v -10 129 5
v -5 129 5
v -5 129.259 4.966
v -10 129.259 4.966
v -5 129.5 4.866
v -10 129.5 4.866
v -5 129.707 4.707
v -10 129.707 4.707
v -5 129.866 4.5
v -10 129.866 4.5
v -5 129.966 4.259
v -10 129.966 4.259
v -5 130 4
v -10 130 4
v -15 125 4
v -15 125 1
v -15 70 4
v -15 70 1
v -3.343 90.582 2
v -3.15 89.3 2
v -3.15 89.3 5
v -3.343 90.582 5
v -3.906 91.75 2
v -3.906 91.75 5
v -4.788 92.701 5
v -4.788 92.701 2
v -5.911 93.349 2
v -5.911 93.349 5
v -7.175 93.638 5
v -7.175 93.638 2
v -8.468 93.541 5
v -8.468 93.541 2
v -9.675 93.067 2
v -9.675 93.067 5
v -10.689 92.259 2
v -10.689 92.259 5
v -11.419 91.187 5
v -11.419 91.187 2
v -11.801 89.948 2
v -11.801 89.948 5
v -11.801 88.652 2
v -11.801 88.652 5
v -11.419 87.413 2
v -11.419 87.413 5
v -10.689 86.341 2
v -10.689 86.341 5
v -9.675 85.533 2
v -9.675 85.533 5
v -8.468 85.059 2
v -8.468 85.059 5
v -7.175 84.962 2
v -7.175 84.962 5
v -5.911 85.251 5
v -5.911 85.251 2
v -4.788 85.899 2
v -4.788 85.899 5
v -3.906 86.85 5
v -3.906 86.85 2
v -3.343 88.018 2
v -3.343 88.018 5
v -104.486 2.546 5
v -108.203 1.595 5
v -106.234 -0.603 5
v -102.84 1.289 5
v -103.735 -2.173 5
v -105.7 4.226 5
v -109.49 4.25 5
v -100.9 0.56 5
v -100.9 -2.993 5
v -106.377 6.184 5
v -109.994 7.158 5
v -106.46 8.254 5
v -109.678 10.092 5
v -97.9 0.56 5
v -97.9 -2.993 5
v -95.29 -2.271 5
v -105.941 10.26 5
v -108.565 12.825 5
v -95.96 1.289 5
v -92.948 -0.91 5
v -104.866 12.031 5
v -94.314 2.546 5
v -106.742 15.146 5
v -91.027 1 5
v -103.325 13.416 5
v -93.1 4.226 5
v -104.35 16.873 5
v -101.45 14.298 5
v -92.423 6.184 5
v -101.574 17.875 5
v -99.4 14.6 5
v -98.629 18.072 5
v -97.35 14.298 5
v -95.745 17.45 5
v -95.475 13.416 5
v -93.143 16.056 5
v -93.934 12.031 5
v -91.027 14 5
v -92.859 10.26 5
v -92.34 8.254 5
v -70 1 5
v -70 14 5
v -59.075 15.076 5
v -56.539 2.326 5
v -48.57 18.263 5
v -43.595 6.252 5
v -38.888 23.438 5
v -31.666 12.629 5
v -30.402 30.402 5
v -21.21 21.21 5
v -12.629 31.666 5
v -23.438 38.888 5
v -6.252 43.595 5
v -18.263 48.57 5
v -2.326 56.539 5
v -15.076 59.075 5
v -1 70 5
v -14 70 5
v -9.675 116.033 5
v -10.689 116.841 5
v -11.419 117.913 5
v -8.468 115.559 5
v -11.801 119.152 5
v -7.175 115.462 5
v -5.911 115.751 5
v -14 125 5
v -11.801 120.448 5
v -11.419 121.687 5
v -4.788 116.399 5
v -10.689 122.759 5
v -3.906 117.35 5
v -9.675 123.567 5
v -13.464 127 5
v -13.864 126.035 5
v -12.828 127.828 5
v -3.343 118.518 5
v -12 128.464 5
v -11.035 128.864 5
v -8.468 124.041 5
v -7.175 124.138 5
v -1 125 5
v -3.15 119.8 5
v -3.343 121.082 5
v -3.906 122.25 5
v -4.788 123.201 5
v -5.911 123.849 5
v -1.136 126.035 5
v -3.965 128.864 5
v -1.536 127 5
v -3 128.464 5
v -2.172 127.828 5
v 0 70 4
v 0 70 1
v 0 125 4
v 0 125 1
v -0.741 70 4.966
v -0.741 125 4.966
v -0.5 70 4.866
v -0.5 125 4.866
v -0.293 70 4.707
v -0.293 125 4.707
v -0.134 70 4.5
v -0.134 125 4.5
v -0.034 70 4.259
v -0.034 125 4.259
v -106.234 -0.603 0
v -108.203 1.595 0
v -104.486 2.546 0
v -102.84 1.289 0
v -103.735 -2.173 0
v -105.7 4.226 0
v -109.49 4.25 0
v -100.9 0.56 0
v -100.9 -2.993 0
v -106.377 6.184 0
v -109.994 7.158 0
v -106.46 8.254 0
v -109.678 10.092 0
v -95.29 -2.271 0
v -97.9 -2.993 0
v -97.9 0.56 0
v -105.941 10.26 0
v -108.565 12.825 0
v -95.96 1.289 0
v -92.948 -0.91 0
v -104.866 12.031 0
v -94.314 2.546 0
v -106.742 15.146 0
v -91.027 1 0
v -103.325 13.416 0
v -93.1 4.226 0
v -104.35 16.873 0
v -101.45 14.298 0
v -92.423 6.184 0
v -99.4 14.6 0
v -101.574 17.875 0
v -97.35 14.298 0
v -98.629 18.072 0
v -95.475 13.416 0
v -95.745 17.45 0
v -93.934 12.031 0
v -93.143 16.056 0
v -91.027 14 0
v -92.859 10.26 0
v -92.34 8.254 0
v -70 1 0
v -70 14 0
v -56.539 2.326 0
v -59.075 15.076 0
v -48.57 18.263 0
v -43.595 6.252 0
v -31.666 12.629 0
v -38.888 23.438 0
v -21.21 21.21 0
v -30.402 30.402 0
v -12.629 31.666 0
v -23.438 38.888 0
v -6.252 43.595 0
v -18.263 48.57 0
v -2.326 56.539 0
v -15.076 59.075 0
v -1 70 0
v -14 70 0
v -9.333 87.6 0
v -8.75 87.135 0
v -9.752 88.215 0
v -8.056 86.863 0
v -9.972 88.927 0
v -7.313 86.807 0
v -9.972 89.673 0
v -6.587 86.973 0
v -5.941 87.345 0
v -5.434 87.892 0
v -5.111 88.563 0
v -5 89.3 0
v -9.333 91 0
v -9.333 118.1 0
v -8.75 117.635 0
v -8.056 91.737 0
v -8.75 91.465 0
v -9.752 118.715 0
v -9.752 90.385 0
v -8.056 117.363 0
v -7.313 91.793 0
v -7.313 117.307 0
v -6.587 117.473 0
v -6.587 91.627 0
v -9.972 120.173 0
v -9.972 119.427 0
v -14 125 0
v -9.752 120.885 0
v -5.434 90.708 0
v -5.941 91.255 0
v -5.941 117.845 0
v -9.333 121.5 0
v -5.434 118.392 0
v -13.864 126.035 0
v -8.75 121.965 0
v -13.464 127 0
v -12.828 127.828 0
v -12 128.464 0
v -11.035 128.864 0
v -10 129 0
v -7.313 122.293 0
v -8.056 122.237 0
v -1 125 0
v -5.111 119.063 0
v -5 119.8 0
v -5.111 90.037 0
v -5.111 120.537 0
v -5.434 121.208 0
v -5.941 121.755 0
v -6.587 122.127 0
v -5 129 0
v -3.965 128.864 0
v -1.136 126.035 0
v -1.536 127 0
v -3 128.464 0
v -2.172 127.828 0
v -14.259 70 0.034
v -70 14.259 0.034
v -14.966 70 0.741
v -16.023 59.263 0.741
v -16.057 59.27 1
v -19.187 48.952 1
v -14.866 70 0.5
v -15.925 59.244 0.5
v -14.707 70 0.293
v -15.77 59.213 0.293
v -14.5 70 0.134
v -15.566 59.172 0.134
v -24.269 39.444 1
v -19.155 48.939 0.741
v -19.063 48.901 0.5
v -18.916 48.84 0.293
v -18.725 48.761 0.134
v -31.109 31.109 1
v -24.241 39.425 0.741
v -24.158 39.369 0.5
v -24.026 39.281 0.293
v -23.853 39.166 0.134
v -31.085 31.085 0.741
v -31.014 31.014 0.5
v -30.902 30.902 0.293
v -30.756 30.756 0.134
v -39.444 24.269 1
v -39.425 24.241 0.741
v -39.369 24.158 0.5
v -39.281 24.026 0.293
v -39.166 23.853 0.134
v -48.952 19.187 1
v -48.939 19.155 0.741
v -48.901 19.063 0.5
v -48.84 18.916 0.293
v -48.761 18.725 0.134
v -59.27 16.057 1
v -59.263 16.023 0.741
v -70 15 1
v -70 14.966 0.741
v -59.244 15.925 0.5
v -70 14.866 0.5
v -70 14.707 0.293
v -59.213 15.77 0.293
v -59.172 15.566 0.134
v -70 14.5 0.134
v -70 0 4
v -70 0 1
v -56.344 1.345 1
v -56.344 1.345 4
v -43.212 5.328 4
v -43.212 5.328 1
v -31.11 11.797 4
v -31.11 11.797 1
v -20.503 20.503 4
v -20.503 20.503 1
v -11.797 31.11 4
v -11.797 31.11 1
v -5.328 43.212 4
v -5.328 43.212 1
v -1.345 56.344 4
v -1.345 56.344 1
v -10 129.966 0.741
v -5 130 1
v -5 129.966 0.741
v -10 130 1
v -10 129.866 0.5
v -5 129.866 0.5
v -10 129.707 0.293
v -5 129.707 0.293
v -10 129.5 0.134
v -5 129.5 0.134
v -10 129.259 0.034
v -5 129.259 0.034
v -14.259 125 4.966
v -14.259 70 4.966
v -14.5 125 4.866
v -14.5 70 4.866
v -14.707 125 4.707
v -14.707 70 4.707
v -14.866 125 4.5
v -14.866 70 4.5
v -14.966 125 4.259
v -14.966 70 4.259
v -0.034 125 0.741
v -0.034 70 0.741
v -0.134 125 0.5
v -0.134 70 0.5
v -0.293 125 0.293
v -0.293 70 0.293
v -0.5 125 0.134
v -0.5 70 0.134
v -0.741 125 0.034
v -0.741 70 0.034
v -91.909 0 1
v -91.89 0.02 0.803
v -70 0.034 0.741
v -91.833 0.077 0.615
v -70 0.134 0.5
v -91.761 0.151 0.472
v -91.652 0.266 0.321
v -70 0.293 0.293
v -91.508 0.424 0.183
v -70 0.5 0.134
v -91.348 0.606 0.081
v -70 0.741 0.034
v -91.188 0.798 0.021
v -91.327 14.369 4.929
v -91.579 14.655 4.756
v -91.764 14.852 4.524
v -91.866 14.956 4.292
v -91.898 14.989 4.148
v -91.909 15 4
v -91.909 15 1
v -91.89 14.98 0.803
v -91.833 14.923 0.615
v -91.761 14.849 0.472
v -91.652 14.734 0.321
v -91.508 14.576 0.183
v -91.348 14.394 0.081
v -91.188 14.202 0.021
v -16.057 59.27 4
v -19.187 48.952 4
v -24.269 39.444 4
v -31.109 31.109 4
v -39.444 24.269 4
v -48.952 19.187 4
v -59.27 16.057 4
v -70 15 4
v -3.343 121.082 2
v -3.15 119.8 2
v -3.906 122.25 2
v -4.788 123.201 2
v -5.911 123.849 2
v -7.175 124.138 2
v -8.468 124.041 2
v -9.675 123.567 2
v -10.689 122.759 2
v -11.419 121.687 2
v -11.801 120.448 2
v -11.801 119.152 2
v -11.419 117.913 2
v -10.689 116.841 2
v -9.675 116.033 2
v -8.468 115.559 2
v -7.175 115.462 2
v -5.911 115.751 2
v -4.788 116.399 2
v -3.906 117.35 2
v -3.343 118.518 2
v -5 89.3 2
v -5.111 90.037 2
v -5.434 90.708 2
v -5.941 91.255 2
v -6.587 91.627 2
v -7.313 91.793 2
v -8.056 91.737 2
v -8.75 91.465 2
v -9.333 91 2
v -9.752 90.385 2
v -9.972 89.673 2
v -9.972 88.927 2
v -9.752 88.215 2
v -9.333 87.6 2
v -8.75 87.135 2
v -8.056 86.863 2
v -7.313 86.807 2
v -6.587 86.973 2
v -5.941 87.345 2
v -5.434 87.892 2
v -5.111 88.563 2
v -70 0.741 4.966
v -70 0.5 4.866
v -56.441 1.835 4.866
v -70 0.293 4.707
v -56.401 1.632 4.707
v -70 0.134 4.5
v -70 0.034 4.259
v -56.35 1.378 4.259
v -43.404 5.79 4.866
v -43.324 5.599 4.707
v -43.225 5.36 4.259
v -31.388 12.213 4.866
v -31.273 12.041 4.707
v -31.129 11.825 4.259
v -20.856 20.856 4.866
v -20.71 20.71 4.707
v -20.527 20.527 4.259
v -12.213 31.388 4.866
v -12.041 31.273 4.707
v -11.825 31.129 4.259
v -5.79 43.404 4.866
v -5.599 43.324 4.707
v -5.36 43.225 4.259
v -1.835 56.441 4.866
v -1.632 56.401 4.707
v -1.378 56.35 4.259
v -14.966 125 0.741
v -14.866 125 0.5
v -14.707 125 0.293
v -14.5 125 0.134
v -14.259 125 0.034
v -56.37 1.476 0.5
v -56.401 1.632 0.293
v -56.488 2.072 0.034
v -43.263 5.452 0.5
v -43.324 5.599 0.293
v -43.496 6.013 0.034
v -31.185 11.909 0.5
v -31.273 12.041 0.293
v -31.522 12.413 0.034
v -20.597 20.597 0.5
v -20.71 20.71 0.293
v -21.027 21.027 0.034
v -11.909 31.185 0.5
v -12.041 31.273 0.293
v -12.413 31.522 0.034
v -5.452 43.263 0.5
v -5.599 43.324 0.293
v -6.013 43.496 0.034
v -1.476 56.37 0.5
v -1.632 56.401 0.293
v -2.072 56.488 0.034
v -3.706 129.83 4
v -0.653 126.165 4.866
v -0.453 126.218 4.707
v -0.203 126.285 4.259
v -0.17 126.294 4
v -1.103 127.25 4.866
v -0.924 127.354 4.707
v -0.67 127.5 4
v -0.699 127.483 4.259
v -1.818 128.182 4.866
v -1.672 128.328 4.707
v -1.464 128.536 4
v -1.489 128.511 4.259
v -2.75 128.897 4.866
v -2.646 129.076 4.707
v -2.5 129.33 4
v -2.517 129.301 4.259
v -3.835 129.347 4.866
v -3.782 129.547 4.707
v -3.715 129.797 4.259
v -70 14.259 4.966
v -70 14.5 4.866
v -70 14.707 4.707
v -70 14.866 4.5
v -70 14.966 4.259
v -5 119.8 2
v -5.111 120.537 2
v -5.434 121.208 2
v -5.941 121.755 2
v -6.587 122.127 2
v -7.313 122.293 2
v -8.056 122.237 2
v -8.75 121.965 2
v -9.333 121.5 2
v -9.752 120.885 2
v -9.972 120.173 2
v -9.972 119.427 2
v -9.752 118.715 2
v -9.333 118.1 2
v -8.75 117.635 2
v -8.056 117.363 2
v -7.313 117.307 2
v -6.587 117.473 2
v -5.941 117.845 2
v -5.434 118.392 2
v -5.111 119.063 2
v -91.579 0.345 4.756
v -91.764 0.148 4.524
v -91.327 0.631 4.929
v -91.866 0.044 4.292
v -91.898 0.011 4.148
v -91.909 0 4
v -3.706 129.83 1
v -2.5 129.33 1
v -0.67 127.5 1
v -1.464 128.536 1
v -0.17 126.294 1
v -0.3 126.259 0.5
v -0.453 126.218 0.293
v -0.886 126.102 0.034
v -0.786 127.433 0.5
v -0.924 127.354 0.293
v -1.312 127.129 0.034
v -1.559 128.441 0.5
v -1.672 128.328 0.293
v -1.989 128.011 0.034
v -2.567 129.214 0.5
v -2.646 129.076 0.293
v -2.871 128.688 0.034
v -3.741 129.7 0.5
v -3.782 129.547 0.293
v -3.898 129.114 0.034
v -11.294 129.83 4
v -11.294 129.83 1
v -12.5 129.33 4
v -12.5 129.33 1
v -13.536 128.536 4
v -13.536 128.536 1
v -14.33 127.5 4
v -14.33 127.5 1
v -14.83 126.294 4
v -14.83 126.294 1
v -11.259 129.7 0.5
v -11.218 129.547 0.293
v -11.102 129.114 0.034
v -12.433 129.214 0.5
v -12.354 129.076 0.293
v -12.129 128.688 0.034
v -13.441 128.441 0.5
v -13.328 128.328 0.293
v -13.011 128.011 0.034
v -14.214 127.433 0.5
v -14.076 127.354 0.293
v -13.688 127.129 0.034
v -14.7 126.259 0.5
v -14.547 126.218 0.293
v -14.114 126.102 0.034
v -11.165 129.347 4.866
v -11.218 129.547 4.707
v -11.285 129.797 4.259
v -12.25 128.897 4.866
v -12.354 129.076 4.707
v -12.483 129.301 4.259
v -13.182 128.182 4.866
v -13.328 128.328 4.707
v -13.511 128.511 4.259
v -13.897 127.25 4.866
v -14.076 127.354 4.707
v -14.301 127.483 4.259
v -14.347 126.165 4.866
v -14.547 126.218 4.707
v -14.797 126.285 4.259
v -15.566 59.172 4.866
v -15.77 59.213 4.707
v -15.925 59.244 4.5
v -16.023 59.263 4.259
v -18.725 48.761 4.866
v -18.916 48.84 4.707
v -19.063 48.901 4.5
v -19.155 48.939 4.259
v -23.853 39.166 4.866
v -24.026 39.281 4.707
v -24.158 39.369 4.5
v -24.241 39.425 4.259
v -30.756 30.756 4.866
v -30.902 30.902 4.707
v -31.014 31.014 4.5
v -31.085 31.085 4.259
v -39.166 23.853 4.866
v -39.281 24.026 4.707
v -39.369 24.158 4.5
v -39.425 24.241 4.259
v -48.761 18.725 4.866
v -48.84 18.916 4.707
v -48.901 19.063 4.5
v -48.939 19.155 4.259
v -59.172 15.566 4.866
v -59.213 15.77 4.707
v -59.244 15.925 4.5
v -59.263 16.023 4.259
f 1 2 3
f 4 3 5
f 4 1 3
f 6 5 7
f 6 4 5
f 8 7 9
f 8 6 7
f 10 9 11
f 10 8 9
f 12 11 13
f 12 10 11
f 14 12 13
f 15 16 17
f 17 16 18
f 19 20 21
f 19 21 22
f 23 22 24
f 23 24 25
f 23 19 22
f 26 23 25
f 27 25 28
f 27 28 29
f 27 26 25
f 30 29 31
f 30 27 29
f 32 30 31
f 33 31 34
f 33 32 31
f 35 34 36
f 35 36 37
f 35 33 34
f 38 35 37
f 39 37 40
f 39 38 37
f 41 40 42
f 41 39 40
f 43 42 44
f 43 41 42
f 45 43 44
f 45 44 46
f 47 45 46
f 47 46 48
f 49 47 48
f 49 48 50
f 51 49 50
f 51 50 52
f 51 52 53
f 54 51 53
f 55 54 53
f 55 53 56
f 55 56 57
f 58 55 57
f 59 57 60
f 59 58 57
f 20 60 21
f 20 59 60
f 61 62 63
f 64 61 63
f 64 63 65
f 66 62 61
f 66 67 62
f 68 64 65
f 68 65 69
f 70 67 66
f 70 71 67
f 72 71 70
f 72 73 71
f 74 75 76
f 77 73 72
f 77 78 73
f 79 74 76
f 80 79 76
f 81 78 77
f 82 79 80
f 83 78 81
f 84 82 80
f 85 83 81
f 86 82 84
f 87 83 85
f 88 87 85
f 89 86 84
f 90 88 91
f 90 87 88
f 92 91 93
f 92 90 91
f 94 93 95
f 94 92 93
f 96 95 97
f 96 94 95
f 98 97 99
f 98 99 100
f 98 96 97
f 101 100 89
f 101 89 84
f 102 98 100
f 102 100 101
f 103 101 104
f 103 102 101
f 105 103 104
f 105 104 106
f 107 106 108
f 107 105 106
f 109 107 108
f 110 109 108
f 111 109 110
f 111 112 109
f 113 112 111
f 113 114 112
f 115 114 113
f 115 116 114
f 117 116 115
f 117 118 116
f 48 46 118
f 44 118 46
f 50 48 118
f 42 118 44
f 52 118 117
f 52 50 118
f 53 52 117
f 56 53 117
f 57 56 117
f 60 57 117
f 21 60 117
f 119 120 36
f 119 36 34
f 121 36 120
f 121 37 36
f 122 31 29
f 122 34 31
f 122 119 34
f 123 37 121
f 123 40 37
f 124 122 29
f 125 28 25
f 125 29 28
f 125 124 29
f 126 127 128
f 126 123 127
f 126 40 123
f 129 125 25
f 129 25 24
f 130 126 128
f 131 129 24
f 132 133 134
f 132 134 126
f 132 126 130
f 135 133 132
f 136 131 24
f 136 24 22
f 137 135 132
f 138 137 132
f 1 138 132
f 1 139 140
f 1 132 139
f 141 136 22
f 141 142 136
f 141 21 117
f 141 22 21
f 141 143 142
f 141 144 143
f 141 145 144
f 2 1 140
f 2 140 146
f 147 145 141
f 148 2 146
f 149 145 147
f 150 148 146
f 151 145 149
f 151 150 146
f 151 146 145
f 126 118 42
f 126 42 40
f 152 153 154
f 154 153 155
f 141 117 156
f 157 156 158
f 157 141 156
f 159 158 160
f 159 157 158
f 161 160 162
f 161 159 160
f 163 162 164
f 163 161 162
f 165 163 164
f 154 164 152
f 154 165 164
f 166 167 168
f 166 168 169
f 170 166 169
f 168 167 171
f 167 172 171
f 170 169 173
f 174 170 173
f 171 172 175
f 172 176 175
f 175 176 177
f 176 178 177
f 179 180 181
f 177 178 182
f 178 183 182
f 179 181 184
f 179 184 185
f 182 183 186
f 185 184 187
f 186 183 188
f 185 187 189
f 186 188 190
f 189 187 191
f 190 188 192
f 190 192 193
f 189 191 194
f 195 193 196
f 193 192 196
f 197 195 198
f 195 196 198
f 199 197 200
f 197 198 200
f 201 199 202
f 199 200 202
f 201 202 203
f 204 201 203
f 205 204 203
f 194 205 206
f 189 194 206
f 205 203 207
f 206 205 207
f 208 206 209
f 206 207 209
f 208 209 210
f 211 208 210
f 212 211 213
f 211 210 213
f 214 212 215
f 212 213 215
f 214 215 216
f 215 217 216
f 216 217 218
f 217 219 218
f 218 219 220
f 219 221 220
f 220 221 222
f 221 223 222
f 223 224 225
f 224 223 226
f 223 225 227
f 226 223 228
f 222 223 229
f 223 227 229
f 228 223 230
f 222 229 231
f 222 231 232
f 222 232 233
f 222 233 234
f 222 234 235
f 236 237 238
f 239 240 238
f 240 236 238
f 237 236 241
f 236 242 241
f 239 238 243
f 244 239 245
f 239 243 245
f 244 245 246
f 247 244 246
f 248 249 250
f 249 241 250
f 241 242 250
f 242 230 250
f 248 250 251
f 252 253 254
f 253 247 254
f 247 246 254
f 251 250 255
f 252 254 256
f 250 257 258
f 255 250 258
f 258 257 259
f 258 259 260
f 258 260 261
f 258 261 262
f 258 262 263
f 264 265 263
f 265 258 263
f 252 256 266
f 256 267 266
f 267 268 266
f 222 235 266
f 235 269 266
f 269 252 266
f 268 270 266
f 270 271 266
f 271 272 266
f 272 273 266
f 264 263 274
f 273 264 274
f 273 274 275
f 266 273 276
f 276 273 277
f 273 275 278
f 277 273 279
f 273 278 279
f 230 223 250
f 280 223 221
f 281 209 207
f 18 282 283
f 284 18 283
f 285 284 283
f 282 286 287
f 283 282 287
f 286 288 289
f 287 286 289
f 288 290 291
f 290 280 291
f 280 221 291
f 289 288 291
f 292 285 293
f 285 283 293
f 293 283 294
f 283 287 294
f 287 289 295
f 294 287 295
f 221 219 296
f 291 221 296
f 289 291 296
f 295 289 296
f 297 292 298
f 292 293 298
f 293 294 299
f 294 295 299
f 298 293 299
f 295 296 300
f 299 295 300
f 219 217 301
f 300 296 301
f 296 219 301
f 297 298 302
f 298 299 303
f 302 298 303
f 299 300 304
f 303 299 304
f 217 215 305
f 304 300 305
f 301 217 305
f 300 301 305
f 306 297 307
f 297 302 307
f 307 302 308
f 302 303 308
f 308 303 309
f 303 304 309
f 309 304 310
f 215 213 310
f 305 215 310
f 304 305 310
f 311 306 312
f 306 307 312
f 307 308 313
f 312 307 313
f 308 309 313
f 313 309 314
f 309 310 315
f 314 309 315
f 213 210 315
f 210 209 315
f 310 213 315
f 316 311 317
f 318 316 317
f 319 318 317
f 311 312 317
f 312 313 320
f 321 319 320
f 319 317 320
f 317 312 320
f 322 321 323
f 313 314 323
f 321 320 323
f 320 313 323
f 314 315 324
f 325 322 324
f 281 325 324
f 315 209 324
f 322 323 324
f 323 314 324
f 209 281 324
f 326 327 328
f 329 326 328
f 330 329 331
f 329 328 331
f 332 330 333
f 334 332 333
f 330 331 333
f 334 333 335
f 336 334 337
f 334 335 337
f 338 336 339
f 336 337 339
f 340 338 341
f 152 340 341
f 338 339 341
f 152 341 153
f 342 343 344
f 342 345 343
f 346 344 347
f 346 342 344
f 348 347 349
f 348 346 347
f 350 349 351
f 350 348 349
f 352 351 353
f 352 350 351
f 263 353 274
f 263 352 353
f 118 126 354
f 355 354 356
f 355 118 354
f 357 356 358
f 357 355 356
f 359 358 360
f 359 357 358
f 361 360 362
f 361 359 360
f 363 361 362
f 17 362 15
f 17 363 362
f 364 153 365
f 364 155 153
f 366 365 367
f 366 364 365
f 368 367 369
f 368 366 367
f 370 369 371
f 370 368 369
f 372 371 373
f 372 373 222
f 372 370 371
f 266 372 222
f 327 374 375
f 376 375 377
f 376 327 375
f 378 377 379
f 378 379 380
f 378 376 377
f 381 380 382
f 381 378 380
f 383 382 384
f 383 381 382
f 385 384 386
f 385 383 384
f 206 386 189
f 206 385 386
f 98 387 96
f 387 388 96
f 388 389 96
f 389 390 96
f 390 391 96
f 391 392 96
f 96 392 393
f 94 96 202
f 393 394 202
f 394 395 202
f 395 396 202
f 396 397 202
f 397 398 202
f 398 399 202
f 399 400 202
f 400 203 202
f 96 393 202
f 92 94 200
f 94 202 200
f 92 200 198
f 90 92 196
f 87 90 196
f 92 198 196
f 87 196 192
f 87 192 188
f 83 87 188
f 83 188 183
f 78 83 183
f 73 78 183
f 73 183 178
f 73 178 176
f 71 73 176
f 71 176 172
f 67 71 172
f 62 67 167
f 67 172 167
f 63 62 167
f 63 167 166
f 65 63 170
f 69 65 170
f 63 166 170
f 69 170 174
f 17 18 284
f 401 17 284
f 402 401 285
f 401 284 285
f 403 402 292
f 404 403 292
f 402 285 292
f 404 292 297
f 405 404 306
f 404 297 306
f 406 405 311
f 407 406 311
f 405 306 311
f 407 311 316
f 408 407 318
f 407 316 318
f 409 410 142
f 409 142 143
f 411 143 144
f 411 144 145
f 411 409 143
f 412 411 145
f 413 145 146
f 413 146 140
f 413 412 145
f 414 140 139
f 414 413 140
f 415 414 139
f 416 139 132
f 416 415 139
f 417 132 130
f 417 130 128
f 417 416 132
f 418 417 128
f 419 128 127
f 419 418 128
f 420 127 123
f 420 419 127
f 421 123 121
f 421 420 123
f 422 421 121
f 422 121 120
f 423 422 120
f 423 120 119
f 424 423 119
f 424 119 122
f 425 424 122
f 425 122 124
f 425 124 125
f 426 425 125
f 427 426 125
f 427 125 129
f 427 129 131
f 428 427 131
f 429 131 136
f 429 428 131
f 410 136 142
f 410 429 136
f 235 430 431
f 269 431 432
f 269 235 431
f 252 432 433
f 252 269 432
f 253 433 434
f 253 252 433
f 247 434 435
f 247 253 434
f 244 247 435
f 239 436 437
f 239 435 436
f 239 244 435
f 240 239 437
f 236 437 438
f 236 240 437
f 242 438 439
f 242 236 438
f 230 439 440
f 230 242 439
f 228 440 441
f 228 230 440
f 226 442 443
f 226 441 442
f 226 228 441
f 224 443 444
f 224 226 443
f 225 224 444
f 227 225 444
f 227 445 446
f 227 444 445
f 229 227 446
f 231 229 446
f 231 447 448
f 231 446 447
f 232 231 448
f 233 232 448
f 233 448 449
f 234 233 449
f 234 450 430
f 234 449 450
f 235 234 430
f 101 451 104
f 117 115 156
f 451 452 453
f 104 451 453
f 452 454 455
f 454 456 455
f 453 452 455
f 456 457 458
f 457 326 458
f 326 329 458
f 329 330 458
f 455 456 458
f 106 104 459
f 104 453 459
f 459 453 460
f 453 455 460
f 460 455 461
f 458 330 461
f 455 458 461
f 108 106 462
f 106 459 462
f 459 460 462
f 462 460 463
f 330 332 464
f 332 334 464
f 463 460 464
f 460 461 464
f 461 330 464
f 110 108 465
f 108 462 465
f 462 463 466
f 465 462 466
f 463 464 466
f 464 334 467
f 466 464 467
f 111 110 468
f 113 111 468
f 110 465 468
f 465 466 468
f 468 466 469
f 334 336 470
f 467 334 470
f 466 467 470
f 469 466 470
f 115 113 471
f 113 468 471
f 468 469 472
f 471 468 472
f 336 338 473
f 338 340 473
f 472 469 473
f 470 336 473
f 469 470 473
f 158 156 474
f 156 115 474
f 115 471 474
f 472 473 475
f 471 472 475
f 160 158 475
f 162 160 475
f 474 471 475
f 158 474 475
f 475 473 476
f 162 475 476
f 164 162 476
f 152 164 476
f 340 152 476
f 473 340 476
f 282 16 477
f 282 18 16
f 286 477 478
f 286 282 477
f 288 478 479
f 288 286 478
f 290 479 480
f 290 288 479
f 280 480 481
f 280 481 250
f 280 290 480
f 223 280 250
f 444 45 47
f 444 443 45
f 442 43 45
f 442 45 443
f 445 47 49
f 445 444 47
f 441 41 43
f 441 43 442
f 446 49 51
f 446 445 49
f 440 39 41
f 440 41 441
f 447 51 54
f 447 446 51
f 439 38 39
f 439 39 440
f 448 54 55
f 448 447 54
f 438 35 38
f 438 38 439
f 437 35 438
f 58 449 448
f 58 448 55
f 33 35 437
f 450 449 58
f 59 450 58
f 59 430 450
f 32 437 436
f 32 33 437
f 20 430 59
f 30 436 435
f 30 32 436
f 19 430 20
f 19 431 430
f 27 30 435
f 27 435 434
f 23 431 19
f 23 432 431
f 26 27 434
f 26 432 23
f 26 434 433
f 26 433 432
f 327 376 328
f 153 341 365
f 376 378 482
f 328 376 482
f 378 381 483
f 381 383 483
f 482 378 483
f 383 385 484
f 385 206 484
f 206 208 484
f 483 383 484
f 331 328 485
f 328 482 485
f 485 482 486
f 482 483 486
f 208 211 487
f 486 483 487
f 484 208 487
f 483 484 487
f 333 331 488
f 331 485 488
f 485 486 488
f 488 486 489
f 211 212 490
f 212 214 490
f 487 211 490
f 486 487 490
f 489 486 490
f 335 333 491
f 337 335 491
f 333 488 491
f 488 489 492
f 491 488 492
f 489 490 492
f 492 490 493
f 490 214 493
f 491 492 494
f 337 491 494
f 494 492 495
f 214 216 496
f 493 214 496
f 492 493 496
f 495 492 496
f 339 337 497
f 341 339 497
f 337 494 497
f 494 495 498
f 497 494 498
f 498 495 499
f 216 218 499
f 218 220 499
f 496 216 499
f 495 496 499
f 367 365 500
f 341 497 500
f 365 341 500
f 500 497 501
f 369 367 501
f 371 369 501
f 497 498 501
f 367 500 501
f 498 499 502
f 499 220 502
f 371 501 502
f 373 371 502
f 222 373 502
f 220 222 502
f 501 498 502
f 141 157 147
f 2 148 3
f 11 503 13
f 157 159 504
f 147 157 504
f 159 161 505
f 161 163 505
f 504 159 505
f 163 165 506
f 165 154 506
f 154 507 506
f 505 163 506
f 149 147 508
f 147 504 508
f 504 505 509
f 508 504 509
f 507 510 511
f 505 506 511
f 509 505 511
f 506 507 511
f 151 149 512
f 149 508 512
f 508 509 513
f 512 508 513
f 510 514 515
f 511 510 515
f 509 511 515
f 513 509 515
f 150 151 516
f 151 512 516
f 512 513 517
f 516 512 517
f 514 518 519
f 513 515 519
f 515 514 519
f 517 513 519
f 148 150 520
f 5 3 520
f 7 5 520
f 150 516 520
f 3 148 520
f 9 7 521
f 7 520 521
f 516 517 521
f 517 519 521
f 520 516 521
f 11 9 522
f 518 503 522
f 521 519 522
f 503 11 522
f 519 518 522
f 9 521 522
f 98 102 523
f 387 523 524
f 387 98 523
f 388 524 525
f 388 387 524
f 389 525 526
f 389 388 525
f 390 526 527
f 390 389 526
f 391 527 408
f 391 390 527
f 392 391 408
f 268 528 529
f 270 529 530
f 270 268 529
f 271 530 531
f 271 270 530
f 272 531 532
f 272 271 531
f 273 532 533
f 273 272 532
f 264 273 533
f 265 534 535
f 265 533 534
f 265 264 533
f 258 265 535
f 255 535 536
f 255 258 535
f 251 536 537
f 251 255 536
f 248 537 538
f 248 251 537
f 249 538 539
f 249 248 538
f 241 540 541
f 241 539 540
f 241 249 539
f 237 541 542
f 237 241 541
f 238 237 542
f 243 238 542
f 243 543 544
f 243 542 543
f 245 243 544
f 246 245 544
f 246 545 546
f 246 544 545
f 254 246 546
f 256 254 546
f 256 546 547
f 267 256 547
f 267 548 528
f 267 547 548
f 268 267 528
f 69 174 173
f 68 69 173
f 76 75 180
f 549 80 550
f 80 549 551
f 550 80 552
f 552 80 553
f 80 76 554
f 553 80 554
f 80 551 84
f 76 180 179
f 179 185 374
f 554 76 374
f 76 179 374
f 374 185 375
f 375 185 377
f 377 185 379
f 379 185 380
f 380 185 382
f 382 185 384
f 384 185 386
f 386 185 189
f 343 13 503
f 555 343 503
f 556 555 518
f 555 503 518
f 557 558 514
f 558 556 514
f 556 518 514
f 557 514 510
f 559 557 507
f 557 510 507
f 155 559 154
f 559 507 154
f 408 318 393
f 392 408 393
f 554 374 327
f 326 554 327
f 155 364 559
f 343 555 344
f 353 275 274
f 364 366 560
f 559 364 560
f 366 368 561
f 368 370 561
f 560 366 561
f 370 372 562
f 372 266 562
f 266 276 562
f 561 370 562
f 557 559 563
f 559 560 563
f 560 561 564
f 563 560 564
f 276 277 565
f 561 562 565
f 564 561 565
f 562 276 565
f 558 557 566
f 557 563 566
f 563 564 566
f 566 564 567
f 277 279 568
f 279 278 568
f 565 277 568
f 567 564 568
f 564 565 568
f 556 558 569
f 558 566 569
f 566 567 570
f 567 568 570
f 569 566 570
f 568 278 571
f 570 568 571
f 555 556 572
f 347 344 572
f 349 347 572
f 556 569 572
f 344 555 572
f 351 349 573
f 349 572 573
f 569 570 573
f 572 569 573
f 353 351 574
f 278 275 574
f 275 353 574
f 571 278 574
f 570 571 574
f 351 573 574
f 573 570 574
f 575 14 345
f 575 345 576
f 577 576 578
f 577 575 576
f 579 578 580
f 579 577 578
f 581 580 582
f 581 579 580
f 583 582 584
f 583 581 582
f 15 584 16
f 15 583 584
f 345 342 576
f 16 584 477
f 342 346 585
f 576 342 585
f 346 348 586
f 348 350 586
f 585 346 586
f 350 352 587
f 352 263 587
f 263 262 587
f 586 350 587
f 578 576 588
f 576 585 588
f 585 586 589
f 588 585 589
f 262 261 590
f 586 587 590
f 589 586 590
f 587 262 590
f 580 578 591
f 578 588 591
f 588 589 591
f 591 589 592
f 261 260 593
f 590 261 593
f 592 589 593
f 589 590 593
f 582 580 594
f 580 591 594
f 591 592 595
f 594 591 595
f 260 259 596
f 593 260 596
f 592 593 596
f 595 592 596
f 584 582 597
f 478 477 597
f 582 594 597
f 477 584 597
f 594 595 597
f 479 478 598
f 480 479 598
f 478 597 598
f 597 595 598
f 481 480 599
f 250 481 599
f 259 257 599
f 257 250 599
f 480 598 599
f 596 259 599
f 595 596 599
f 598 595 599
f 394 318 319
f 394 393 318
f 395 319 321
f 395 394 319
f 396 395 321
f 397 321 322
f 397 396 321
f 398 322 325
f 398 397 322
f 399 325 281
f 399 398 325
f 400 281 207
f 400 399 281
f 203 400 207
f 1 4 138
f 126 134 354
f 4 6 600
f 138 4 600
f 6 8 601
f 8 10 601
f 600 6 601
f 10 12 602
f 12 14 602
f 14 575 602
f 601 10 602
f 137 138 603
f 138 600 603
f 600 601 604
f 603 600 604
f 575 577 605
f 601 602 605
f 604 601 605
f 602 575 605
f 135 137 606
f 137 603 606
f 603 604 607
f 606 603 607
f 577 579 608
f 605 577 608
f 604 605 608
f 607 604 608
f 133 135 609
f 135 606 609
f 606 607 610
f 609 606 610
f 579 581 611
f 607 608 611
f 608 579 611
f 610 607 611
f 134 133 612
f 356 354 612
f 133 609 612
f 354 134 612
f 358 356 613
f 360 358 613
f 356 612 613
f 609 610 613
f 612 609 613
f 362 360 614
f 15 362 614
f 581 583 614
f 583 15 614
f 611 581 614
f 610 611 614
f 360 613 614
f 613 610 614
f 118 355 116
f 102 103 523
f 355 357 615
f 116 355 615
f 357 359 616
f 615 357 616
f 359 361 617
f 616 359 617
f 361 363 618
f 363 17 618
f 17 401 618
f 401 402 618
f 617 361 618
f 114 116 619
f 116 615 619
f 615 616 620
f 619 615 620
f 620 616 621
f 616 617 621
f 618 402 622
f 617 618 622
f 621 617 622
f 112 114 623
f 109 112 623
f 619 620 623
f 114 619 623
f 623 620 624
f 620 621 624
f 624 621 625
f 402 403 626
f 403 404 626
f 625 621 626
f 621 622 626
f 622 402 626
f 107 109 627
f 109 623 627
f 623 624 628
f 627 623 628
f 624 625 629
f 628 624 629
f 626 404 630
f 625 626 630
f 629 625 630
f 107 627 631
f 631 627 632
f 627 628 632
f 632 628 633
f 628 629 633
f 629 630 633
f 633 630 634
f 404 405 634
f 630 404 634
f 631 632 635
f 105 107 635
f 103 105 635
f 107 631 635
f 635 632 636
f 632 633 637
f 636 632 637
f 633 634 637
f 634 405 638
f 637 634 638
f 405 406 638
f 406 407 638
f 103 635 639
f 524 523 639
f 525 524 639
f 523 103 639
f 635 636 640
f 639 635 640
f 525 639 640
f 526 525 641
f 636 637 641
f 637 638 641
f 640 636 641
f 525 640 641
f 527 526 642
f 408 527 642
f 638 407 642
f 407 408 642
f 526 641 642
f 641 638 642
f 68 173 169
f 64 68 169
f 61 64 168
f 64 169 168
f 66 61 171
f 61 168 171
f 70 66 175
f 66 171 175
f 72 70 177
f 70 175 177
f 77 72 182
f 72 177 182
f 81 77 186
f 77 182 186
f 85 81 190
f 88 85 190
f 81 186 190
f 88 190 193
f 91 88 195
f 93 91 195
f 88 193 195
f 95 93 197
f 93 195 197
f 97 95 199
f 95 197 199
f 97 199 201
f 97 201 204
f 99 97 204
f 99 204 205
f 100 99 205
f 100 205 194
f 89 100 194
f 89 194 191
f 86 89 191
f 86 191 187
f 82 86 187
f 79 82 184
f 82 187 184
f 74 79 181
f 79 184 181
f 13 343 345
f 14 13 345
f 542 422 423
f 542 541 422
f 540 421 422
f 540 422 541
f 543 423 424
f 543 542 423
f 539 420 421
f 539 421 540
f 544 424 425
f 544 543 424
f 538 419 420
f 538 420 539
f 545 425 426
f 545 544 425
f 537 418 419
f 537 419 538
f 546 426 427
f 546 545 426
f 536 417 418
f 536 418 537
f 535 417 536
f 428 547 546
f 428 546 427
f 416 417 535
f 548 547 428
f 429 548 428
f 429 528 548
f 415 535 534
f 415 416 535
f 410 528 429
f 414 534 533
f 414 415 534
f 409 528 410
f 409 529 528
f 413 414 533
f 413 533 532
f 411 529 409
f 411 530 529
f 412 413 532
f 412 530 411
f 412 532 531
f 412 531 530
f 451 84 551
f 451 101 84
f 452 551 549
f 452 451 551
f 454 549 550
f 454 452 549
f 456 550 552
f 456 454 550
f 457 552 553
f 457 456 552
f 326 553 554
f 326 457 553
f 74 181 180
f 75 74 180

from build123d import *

# Parameters (mm, degrees)
F0_R     = 2.5
F1_DEPTH = 5
F3_R     = 4.35
F4_DEPTH = 3
F5_R     = 5
F6_R     = 5
F7_R     = 1
F8_R     = 1


with BuildPart() as f1:
    # F0 (on Top) → F1 (new body)
    with BuildSketch(Plane.XY):
        with BuildLine():
            Line((0, 130), (-15, 130))
            Line((-15, 130), (-15, 70))
            ThreePointArc((-15, 70), (-31.109127, 31.109127), (-70, 15))
            Line((-70, 15), (-91.909339, 15))
            ThreePointArc((-91.909339, 15), (-108.882194, 12.237932), (-100.9, -2.993331))
            Line((-100.9, -2.993331), (-100.9, 0.560259))
            ThreePointArc((-100.9, 0.560259), (-99.4, 14.6), (-97.9, 0.560259))
            Line((-97.9, 0.560259), (-97.9, -2.993331))
            ThreePointArc((-97.9, -2.993331), (-94.662068, -1.982194), (-91.909339, 0))
            Line((-91.909339, 0), (-70, 0))
            ThreePointArc((-70, 0), (-20.502525, 20.502525), (0, 70))
            Line((0, 70), (0, 130))
        make_face()
        with Locations((-7.5, 89.3)):
            Circle(F0_R, mode=Mode.SUBTRACT)
        with Locations((-7.5, 119.8)):
            Circle(F0_R, mode=Mode.SUBTRACT)
    extrude(amount=F1_DEPTH)

    # F3 (on offset) → F4 (cut, through all)
    with BuildSketch(Plane.XY.offset(2)):
        with Locations((-7.5, 89.3)):
            Circle(F3_R)
        with Locations((-7.5, 119.8)):
            Circle(F3_R)
    extrude(amount=F4_DEPTH, mode=Mode.SUBTRACT)

    # F5
    f5_edges = [f1.edges().sort_by_distance(p)[0] for p in [
        (0, 130, 2.5),
    ]]
    fillet(f5_edges, radius=F5_R)

    # F6
    f6_edges = [f1.edges().sort_by_distance(p)[0] for p in [
        (-15, 130, 2.5),
    ]]
    fillet(f6_edges, radius=F6_R)

    # F7
    f7_edges = [f1.edges().sort_by_distance(p)[0] for p in [
        (0, 97.5, 5),
    ]]
    fillet(f7_edges, radius=F7_R)

    # F8
    f8_edges = [f1.edges().sort_by_distance(p)[0] for p in [
        (0, 97.5, 0),
    ]]
    fillet(f8_edges, radius=F8_R)


solid = f1.part
